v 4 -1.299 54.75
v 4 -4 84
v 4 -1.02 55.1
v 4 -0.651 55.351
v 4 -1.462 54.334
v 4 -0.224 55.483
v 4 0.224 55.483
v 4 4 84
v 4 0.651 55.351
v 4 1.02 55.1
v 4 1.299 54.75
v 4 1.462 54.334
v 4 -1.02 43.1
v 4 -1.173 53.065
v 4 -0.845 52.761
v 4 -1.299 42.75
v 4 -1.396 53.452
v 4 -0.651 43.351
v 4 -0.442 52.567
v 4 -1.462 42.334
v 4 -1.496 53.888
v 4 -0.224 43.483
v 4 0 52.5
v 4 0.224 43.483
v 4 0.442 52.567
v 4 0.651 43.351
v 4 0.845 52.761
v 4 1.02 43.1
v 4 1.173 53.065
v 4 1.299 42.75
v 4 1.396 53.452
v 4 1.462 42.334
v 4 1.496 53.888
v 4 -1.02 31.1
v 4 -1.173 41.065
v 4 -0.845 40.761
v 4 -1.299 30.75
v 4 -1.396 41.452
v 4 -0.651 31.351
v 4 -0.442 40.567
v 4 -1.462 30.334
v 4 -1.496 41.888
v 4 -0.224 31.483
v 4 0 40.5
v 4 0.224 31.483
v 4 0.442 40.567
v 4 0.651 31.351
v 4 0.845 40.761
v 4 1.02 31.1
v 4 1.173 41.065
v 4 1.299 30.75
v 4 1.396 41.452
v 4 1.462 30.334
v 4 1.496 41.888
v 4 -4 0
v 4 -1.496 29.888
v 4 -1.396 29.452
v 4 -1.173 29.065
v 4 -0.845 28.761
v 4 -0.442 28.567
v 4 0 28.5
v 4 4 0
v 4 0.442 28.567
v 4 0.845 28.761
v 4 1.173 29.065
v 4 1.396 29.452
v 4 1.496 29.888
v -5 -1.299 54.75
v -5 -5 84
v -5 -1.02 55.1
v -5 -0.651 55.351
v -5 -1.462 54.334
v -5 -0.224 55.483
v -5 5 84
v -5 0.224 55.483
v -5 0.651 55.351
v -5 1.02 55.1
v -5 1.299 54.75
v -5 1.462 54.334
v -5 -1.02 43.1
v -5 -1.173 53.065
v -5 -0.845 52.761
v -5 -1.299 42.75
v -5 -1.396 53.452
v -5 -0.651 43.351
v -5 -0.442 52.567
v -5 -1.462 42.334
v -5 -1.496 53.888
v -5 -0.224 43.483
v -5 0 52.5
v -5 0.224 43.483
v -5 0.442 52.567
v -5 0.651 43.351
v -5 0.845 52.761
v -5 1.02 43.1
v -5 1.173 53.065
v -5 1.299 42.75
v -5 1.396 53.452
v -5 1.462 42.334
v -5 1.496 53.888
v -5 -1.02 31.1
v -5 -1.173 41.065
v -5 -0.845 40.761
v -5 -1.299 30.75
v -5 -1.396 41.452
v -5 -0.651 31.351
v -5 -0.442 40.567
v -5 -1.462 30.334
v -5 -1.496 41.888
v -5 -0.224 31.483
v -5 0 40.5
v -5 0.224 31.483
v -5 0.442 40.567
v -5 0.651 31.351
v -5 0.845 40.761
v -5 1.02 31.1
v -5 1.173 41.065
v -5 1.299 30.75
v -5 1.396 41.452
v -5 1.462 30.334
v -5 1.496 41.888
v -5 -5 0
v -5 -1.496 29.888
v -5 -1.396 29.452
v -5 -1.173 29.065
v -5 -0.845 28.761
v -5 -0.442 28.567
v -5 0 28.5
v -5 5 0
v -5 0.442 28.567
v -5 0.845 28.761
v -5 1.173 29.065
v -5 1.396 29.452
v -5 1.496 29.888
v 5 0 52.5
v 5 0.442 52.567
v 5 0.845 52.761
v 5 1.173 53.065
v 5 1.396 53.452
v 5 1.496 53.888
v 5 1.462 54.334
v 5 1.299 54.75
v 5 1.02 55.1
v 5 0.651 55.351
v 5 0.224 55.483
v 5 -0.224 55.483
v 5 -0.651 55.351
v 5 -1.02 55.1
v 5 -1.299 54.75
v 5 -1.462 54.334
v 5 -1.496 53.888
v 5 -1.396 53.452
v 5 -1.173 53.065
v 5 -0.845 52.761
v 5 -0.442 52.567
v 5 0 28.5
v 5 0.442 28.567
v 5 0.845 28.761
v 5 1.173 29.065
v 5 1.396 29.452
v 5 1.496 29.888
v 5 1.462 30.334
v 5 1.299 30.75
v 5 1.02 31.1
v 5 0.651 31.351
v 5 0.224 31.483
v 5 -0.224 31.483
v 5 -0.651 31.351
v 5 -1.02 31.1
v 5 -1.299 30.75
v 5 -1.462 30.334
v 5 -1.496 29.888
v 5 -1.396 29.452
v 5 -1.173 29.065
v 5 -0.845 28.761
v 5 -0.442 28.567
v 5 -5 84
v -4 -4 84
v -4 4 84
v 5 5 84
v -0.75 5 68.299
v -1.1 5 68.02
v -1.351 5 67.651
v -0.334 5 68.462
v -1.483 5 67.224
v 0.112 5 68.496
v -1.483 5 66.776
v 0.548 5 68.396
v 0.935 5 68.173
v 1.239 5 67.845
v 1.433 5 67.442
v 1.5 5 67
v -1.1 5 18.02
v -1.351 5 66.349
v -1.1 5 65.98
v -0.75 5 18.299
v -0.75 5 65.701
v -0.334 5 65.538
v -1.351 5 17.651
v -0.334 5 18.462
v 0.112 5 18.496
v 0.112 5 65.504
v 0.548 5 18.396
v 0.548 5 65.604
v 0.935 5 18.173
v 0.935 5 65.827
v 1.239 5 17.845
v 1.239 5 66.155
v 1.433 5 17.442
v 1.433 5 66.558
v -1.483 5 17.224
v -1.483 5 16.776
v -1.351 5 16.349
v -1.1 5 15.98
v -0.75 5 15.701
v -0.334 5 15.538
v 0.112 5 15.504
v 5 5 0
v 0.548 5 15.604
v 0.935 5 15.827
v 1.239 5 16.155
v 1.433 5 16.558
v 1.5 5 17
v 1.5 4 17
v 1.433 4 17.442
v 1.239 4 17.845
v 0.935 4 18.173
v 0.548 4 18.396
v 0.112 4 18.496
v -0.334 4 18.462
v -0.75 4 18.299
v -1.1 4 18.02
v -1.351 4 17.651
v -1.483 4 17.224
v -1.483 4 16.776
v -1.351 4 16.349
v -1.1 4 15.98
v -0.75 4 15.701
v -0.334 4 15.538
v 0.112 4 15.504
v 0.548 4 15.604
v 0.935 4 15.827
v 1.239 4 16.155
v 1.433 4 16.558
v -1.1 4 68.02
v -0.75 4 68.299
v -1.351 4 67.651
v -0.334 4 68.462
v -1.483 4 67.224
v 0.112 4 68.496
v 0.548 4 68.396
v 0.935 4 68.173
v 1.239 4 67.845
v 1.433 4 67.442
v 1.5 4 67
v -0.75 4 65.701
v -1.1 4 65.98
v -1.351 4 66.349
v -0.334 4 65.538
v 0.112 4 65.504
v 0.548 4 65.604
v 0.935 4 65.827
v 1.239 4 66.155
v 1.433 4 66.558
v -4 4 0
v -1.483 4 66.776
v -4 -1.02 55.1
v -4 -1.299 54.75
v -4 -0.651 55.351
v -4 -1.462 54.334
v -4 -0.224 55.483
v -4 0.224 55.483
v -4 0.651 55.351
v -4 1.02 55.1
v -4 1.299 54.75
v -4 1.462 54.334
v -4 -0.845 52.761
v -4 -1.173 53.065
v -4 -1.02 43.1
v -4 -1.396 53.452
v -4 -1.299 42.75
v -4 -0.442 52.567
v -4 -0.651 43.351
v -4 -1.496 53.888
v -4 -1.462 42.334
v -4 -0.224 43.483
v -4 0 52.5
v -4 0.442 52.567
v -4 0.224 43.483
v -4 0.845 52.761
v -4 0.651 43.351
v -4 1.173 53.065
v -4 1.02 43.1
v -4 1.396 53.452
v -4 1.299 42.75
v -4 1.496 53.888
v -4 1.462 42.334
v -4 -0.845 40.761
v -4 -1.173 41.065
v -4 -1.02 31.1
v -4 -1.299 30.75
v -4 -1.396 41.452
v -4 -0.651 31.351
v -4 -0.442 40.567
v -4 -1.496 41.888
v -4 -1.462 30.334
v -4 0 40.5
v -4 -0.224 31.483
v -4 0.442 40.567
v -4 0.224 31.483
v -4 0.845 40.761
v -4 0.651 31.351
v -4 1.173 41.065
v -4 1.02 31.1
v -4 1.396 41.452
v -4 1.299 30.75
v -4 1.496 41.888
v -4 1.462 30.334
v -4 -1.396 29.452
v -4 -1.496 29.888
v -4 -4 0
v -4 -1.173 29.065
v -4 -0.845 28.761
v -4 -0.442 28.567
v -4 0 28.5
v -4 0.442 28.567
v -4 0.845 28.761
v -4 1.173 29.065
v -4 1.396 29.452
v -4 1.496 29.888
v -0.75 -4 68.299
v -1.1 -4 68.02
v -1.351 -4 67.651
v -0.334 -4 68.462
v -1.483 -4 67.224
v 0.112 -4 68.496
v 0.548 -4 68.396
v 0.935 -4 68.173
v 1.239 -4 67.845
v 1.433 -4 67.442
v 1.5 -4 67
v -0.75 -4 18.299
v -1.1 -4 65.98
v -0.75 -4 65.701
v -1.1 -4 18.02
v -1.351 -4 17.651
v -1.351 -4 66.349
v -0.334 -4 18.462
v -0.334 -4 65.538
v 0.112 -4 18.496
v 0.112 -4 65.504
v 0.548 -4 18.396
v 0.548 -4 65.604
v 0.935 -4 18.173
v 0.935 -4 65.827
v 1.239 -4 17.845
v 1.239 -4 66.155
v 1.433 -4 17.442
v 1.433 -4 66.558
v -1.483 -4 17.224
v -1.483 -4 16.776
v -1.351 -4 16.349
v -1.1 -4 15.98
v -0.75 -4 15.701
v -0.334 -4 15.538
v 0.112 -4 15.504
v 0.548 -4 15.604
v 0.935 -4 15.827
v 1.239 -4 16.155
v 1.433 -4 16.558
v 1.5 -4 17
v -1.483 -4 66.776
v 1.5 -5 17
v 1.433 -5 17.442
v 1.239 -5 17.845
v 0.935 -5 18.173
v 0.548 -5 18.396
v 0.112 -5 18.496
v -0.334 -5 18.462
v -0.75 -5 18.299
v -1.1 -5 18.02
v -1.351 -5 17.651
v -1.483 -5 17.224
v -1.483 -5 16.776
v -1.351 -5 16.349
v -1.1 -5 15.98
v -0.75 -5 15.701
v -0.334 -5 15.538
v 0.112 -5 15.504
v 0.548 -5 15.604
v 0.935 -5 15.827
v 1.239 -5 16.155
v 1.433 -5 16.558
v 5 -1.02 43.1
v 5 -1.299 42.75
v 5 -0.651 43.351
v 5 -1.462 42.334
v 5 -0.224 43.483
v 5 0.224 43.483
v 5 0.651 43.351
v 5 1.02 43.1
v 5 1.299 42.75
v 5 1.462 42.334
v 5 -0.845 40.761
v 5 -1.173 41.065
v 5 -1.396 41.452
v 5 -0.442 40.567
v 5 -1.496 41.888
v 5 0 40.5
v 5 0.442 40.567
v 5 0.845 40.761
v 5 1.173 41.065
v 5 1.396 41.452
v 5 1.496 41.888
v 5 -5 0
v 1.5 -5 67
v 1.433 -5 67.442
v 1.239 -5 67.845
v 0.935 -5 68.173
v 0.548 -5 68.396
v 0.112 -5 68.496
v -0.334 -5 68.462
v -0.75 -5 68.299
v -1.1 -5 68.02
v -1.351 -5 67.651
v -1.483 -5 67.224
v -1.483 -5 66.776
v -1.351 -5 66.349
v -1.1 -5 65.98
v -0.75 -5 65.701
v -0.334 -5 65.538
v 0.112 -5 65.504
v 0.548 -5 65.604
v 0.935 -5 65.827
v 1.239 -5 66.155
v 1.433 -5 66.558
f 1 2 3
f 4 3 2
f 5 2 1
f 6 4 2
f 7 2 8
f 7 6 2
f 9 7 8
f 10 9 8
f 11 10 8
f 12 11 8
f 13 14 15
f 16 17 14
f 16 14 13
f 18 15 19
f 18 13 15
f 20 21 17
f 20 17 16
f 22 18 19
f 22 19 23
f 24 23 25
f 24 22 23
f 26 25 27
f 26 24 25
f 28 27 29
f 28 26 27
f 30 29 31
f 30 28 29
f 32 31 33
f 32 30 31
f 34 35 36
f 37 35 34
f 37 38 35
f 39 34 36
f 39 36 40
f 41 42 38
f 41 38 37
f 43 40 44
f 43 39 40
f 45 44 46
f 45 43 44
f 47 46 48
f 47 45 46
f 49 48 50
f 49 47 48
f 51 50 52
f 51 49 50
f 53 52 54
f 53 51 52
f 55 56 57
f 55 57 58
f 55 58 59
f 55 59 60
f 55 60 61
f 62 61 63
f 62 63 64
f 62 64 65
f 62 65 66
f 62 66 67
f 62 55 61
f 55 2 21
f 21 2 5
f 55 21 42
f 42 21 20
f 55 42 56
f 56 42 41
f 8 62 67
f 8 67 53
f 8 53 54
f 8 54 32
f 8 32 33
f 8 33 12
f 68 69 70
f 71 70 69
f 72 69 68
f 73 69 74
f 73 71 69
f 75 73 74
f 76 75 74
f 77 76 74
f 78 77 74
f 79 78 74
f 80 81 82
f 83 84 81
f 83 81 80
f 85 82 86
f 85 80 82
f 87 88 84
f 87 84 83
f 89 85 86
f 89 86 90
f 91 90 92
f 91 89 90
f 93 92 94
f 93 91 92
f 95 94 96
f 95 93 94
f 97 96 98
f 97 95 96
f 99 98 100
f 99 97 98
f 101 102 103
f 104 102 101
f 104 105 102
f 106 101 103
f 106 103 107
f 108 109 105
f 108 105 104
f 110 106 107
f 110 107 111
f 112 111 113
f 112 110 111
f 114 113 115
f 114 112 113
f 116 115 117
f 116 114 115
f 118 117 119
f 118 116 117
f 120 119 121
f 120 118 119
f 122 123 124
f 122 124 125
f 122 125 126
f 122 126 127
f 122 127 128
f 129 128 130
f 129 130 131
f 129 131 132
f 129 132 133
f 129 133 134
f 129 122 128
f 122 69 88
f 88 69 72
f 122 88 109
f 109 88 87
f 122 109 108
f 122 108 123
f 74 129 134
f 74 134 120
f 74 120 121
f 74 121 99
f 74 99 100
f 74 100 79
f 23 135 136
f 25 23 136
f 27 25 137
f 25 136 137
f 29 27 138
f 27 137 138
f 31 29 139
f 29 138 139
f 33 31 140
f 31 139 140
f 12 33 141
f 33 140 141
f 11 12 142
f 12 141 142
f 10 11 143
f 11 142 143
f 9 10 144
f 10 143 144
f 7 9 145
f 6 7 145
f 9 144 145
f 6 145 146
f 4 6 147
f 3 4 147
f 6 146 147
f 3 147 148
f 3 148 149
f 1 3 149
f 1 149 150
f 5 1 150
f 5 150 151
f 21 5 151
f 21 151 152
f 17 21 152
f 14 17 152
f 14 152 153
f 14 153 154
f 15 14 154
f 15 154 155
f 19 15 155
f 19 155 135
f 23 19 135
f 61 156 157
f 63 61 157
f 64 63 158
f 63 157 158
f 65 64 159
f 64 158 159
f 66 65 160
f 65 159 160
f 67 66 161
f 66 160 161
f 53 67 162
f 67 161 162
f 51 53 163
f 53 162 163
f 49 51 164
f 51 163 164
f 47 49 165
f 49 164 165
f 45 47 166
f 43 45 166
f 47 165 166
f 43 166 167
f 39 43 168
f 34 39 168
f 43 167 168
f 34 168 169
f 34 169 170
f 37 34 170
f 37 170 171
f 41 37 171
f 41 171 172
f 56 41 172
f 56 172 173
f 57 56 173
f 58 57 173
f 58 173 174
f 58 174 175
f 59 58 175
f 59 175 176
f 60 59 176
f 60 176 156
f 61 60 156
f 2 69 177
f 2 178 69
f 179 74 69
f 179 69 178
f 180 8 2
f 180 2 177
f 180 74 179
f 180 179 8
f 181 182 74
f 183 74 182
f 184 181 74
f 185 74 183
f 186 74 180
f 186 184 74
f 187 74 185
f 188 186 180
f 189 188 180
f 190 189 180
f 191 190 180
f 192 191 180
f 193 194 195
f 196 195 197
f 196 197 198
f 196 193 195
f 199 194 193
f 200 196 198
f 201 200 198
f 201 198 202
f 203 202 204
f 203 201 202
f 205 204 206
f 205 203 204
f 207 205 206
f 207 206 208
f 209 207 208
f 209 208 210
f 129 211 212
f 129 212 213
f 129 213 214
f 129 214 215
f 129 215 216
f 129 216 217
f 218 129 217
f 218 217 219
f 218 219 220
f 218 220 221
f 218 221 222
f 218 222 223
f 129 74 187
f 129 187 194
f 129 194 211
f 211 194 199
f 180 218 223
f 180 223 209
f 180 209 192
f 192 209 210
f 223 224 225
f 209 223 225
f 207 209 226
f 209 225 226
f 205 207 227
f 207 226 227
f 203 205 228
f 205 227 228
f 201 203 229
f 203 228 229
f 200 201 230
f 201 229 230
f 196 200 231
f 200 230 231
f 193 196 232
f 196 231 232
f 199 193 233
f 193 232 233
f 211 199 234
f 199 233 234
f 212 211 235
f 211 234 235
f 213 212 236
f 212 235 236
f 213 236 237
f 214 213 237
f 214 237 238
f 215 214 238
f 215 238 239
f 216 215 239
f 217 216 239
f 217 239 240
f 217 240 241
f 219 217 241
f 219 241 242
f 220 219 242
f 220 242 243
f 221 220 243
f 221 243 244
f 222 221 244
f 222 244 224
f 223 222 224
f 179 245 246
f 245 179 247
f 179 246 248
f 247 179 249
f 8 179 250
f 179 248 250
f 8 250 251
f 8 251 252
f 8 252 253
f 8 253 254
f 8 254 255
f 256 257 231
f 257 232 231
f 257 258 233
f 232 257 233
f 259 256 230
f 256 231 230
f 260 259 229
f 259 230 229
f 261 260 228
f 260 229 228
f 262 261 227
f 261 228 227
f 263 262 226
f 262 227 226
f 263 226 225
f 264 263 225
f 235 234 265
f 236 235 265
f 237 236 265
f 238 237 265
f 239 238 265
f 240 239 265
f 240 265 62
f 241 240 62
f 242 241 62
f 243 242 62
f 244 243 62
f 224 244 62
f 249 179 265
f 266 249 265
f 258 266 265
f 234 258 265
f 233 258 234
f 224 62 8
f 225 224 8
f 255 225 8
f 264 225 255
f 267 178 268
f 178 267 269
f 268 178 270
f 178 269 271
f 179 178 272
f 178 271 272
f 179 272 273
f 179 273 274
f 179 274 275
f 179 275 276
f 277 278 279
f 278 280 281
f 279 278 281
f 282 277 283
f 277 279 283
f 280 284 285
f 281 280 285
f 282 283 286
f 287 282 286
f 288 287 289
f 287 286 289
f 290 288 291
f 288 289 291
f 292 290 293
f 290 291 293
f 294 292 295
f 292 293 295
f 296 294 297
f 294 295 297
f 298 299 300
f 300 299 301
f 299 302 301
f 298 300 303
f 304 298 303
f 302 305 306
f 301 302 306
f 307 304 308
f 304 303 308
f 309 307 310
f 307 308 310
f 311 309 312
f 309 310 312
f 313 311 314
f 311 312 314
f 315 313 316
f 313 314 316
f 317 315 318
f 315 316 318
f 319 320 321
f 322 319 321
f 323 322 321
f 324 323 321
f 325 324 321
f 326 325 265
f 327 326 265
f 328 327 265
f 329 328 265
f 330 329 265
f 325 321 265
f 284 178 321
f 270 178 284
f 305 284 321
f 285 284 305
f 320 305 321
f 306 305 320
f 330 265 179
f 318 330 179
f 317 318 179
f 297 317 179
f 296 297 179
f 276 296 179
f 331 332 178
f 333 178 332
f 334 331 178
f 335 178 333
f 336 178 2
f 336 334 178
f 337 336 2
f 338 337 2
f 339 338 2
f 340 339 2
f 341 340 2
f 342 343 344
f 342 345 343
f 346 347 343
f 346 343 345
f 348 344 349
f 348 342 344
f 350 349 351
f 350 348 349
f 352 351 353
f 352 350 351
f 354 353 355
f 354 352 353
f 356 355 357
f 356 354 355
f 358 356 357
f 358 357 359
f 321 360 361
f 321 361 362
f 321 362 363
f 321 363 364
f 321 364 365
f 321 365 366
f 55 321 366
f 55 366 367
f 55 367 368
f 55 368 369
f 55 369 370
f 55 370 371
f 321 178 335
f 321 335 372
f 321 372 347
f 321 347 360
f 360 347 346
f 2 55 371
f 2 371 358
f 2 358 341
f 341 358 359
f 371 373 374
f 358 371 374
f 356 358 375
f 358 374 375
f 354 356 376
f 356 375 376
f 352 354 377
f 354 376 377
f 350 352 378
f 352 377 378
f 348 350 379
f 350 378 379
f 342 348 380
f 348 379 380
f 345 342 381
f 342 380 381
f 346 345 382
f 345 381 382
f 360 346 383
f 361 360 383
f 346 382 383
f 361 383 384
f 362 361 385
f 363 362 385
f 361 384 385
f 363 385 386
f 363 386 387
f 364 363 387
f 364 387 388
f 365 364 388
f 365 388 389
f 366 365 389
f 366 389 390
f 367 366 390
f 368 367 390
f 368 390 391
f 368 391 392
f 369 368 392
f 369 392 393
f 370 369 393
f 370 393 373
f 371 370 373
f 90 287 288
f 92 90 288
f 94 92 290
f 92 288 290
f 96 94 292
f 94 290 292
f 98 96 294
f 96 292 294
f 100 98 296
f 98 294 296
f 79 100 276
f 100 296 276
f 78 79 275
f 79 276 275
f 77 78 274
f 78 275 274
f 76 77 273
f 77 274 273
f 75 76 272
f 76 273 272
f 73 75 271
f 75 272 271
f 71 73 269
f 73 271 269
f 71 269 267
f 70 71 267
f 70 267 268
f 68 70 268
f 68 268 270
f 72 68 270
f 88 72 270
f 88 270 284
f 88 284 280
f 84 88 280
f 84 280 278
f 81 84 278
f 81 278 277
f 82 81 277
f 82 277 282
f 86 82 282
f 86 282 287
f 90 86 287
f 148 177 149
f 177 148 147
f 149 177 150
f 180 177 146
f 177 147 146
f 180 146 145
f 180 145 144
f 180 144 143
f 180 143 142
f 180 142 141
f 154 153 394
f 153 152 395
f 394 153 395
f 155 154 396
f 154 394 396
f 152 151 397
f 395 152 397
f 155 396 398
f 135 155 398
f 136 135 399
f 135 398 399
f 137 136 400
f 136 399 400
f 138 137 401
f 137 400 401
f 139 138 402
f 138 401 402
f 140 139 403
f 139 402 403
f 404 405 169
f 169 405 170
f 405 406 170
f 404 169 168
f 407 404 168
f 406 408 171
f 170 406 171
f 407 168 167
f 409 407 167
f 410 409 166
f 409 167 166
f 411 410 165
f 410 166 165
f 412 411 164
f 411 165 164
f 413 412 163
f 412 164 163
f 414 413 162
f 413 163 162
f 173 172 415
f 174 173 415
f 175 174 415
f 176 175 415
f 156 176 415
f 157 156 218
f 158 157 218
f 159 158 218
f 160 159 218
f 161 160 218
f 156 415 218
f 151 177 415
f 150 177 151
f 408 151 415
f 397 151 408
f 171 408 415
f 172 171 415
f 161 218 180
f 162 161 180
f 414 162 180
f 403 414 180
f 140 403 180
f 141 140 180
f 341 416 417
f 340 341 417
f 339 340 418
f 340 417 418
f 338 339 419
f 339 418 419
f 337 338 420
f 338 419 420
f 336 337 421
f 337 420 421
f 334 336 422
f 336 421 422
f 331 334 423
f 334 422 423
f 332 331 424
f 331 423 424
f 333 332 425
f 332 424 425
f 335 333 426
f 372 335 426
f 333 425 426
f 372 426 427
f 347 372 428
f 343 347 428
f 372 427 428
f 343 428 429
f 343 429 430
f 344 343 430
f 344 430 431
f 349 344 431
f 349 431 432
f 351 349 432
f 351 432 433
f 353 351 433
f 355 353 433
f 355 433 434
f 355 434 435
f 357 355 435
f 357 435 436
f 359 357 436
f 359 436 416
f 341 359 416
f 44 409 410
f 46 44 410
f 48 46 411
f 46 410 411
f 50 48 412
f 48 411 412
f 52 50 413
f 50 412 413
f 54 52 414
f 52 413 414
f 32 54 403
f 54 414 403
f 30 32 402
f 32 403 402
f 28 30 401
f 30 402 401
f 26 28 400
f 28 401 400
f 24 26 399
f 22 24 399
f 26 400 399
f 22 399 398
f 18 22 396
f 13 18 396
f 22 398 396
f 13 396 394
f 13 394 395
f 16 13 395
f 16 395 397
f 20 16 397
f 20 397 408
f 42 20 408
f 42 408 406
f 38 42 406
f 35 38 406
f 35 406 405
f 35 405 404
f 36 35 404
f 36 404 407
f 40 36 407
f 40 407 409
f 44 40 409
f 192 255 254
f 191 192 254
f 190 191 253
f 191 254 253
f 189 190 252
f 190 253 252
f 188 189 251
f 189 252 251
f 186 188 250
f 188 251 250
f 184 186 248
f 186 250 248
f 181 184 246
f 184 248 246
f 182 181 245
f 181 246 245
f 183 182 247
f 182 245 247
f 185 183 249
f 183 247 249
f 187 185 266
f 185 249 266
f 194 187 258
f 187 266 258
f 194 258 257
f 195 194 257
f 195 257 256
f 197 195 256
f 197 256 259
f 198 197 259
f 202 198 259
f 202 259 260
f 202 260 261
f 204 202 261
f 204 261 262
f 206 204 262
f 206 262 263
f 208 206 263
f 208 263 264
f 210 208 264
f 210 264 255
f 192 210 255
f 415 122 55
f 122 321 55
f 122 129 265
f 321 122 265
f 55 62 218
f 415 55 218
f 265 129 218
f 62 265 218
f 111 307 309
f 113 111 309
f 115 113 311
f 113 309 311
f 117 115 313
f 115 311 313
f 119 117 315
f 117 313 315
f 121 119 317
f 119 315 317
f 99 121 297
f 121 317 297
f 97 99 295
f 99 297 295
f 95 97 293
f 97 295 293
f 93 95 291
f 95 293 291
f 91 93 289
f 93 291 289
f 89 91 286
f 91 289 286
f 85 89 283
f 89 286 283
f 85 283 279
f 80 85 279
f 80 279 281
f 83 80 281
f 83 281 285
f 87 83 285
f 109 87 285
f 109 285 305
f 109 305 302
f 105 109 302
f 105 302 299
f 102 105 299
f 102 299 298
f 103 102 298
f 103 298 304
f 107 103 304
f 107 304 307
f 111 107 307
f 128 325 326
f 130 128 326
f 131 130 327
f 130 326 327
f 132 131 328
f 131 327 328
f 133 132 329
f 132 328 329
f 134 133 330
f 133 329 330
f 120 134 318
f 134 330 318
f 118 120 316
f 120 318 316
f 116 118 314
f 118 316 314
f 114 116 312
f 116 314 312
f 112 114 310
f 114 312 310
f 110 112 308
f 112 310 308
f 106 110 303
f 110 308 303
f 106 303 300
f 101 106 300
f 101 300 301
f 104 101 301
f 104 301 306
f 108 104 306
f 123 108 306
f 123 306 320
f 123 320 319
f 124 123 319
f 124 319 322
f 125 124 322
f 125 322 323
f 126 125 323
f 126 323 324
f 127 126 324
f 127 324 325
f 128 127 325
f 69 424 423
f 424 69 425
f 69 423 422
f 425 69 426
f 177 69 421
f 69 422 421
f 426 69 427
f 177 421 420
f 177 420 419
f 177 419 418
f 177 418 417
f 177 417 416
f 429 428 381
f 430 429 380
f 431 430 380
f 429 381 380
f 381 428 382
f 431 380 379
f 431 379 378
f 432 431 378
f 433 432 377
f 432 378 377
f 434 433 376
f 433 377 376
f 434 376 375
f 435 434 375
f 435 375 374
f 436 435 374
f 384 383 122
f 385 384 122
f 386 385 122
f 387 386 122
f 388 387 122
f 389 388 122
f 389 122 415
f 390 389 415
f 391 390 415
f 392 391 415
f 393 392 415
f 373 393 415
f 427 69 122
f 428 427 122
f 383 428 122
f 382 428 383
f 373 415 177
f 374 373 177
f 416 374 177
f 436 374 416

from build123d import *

# Parameters (mm, degrees)
SKETCH_1_W          = 10
SKETCH_1_H          = 10
SKETCH_1_W_2        = 8
SKETCH_1_H_2        = 8
EXTRUDE_1_DEPTH     = 84
SKETCH_2_R          = 1.5
CUT_EXTRUDE_1_DEPTH = 11
SKETCH_3_R          = 1.5
CUT_EXTRUDE_2_DEPTH = 11


with BuildPart() as part:
    # 草图1 → 拉伸-薄壁1 (new body)
    with BuildSketch(Plane.XY):
        Rectangle(SKETCH_1_W, SKETCH_1_H)
        Rectangle(SKETCH_1_W_2, SKETCH_1_H_2, mode=Mode.SUBTRACT)
    extrude(amount=EXTRUDE_1_DEPTH)

    # 草图2 → 切除-拉伸1 (cut, through all)
    with BuildSketch(Plane(origin=(5, 0, 0), x_dir=(0, 0, -1), z_dir=(1, 0, 0))):
        with Locations((-54, 0)):
            Circle(SKETCH_2_R)
        with Locations((-30, 0)):
            Circle(SKETCH_2_R)
        with Locations((-42, 0)):
            Circle(SKETCH_2_R)
    extrude(amount=-CUT_EXTRUDE_1_DEPTH, mode=Mode.SUBTRACT)

    # 草图3 → 切除-拉伸2 (cut, through all)
    with BuildSketch(Plane.XZ.offset(5)):
        with Locations((0, 17)):
            Circle(SKETCH_3_R)
        with Locations((0, 67)):
            Circle(SKETCH_3_R)
    extrude(amount=-CUT_EXTRUDE_2_DEPTH, mode=Mode.SUBTRACT)


solid = part.part
